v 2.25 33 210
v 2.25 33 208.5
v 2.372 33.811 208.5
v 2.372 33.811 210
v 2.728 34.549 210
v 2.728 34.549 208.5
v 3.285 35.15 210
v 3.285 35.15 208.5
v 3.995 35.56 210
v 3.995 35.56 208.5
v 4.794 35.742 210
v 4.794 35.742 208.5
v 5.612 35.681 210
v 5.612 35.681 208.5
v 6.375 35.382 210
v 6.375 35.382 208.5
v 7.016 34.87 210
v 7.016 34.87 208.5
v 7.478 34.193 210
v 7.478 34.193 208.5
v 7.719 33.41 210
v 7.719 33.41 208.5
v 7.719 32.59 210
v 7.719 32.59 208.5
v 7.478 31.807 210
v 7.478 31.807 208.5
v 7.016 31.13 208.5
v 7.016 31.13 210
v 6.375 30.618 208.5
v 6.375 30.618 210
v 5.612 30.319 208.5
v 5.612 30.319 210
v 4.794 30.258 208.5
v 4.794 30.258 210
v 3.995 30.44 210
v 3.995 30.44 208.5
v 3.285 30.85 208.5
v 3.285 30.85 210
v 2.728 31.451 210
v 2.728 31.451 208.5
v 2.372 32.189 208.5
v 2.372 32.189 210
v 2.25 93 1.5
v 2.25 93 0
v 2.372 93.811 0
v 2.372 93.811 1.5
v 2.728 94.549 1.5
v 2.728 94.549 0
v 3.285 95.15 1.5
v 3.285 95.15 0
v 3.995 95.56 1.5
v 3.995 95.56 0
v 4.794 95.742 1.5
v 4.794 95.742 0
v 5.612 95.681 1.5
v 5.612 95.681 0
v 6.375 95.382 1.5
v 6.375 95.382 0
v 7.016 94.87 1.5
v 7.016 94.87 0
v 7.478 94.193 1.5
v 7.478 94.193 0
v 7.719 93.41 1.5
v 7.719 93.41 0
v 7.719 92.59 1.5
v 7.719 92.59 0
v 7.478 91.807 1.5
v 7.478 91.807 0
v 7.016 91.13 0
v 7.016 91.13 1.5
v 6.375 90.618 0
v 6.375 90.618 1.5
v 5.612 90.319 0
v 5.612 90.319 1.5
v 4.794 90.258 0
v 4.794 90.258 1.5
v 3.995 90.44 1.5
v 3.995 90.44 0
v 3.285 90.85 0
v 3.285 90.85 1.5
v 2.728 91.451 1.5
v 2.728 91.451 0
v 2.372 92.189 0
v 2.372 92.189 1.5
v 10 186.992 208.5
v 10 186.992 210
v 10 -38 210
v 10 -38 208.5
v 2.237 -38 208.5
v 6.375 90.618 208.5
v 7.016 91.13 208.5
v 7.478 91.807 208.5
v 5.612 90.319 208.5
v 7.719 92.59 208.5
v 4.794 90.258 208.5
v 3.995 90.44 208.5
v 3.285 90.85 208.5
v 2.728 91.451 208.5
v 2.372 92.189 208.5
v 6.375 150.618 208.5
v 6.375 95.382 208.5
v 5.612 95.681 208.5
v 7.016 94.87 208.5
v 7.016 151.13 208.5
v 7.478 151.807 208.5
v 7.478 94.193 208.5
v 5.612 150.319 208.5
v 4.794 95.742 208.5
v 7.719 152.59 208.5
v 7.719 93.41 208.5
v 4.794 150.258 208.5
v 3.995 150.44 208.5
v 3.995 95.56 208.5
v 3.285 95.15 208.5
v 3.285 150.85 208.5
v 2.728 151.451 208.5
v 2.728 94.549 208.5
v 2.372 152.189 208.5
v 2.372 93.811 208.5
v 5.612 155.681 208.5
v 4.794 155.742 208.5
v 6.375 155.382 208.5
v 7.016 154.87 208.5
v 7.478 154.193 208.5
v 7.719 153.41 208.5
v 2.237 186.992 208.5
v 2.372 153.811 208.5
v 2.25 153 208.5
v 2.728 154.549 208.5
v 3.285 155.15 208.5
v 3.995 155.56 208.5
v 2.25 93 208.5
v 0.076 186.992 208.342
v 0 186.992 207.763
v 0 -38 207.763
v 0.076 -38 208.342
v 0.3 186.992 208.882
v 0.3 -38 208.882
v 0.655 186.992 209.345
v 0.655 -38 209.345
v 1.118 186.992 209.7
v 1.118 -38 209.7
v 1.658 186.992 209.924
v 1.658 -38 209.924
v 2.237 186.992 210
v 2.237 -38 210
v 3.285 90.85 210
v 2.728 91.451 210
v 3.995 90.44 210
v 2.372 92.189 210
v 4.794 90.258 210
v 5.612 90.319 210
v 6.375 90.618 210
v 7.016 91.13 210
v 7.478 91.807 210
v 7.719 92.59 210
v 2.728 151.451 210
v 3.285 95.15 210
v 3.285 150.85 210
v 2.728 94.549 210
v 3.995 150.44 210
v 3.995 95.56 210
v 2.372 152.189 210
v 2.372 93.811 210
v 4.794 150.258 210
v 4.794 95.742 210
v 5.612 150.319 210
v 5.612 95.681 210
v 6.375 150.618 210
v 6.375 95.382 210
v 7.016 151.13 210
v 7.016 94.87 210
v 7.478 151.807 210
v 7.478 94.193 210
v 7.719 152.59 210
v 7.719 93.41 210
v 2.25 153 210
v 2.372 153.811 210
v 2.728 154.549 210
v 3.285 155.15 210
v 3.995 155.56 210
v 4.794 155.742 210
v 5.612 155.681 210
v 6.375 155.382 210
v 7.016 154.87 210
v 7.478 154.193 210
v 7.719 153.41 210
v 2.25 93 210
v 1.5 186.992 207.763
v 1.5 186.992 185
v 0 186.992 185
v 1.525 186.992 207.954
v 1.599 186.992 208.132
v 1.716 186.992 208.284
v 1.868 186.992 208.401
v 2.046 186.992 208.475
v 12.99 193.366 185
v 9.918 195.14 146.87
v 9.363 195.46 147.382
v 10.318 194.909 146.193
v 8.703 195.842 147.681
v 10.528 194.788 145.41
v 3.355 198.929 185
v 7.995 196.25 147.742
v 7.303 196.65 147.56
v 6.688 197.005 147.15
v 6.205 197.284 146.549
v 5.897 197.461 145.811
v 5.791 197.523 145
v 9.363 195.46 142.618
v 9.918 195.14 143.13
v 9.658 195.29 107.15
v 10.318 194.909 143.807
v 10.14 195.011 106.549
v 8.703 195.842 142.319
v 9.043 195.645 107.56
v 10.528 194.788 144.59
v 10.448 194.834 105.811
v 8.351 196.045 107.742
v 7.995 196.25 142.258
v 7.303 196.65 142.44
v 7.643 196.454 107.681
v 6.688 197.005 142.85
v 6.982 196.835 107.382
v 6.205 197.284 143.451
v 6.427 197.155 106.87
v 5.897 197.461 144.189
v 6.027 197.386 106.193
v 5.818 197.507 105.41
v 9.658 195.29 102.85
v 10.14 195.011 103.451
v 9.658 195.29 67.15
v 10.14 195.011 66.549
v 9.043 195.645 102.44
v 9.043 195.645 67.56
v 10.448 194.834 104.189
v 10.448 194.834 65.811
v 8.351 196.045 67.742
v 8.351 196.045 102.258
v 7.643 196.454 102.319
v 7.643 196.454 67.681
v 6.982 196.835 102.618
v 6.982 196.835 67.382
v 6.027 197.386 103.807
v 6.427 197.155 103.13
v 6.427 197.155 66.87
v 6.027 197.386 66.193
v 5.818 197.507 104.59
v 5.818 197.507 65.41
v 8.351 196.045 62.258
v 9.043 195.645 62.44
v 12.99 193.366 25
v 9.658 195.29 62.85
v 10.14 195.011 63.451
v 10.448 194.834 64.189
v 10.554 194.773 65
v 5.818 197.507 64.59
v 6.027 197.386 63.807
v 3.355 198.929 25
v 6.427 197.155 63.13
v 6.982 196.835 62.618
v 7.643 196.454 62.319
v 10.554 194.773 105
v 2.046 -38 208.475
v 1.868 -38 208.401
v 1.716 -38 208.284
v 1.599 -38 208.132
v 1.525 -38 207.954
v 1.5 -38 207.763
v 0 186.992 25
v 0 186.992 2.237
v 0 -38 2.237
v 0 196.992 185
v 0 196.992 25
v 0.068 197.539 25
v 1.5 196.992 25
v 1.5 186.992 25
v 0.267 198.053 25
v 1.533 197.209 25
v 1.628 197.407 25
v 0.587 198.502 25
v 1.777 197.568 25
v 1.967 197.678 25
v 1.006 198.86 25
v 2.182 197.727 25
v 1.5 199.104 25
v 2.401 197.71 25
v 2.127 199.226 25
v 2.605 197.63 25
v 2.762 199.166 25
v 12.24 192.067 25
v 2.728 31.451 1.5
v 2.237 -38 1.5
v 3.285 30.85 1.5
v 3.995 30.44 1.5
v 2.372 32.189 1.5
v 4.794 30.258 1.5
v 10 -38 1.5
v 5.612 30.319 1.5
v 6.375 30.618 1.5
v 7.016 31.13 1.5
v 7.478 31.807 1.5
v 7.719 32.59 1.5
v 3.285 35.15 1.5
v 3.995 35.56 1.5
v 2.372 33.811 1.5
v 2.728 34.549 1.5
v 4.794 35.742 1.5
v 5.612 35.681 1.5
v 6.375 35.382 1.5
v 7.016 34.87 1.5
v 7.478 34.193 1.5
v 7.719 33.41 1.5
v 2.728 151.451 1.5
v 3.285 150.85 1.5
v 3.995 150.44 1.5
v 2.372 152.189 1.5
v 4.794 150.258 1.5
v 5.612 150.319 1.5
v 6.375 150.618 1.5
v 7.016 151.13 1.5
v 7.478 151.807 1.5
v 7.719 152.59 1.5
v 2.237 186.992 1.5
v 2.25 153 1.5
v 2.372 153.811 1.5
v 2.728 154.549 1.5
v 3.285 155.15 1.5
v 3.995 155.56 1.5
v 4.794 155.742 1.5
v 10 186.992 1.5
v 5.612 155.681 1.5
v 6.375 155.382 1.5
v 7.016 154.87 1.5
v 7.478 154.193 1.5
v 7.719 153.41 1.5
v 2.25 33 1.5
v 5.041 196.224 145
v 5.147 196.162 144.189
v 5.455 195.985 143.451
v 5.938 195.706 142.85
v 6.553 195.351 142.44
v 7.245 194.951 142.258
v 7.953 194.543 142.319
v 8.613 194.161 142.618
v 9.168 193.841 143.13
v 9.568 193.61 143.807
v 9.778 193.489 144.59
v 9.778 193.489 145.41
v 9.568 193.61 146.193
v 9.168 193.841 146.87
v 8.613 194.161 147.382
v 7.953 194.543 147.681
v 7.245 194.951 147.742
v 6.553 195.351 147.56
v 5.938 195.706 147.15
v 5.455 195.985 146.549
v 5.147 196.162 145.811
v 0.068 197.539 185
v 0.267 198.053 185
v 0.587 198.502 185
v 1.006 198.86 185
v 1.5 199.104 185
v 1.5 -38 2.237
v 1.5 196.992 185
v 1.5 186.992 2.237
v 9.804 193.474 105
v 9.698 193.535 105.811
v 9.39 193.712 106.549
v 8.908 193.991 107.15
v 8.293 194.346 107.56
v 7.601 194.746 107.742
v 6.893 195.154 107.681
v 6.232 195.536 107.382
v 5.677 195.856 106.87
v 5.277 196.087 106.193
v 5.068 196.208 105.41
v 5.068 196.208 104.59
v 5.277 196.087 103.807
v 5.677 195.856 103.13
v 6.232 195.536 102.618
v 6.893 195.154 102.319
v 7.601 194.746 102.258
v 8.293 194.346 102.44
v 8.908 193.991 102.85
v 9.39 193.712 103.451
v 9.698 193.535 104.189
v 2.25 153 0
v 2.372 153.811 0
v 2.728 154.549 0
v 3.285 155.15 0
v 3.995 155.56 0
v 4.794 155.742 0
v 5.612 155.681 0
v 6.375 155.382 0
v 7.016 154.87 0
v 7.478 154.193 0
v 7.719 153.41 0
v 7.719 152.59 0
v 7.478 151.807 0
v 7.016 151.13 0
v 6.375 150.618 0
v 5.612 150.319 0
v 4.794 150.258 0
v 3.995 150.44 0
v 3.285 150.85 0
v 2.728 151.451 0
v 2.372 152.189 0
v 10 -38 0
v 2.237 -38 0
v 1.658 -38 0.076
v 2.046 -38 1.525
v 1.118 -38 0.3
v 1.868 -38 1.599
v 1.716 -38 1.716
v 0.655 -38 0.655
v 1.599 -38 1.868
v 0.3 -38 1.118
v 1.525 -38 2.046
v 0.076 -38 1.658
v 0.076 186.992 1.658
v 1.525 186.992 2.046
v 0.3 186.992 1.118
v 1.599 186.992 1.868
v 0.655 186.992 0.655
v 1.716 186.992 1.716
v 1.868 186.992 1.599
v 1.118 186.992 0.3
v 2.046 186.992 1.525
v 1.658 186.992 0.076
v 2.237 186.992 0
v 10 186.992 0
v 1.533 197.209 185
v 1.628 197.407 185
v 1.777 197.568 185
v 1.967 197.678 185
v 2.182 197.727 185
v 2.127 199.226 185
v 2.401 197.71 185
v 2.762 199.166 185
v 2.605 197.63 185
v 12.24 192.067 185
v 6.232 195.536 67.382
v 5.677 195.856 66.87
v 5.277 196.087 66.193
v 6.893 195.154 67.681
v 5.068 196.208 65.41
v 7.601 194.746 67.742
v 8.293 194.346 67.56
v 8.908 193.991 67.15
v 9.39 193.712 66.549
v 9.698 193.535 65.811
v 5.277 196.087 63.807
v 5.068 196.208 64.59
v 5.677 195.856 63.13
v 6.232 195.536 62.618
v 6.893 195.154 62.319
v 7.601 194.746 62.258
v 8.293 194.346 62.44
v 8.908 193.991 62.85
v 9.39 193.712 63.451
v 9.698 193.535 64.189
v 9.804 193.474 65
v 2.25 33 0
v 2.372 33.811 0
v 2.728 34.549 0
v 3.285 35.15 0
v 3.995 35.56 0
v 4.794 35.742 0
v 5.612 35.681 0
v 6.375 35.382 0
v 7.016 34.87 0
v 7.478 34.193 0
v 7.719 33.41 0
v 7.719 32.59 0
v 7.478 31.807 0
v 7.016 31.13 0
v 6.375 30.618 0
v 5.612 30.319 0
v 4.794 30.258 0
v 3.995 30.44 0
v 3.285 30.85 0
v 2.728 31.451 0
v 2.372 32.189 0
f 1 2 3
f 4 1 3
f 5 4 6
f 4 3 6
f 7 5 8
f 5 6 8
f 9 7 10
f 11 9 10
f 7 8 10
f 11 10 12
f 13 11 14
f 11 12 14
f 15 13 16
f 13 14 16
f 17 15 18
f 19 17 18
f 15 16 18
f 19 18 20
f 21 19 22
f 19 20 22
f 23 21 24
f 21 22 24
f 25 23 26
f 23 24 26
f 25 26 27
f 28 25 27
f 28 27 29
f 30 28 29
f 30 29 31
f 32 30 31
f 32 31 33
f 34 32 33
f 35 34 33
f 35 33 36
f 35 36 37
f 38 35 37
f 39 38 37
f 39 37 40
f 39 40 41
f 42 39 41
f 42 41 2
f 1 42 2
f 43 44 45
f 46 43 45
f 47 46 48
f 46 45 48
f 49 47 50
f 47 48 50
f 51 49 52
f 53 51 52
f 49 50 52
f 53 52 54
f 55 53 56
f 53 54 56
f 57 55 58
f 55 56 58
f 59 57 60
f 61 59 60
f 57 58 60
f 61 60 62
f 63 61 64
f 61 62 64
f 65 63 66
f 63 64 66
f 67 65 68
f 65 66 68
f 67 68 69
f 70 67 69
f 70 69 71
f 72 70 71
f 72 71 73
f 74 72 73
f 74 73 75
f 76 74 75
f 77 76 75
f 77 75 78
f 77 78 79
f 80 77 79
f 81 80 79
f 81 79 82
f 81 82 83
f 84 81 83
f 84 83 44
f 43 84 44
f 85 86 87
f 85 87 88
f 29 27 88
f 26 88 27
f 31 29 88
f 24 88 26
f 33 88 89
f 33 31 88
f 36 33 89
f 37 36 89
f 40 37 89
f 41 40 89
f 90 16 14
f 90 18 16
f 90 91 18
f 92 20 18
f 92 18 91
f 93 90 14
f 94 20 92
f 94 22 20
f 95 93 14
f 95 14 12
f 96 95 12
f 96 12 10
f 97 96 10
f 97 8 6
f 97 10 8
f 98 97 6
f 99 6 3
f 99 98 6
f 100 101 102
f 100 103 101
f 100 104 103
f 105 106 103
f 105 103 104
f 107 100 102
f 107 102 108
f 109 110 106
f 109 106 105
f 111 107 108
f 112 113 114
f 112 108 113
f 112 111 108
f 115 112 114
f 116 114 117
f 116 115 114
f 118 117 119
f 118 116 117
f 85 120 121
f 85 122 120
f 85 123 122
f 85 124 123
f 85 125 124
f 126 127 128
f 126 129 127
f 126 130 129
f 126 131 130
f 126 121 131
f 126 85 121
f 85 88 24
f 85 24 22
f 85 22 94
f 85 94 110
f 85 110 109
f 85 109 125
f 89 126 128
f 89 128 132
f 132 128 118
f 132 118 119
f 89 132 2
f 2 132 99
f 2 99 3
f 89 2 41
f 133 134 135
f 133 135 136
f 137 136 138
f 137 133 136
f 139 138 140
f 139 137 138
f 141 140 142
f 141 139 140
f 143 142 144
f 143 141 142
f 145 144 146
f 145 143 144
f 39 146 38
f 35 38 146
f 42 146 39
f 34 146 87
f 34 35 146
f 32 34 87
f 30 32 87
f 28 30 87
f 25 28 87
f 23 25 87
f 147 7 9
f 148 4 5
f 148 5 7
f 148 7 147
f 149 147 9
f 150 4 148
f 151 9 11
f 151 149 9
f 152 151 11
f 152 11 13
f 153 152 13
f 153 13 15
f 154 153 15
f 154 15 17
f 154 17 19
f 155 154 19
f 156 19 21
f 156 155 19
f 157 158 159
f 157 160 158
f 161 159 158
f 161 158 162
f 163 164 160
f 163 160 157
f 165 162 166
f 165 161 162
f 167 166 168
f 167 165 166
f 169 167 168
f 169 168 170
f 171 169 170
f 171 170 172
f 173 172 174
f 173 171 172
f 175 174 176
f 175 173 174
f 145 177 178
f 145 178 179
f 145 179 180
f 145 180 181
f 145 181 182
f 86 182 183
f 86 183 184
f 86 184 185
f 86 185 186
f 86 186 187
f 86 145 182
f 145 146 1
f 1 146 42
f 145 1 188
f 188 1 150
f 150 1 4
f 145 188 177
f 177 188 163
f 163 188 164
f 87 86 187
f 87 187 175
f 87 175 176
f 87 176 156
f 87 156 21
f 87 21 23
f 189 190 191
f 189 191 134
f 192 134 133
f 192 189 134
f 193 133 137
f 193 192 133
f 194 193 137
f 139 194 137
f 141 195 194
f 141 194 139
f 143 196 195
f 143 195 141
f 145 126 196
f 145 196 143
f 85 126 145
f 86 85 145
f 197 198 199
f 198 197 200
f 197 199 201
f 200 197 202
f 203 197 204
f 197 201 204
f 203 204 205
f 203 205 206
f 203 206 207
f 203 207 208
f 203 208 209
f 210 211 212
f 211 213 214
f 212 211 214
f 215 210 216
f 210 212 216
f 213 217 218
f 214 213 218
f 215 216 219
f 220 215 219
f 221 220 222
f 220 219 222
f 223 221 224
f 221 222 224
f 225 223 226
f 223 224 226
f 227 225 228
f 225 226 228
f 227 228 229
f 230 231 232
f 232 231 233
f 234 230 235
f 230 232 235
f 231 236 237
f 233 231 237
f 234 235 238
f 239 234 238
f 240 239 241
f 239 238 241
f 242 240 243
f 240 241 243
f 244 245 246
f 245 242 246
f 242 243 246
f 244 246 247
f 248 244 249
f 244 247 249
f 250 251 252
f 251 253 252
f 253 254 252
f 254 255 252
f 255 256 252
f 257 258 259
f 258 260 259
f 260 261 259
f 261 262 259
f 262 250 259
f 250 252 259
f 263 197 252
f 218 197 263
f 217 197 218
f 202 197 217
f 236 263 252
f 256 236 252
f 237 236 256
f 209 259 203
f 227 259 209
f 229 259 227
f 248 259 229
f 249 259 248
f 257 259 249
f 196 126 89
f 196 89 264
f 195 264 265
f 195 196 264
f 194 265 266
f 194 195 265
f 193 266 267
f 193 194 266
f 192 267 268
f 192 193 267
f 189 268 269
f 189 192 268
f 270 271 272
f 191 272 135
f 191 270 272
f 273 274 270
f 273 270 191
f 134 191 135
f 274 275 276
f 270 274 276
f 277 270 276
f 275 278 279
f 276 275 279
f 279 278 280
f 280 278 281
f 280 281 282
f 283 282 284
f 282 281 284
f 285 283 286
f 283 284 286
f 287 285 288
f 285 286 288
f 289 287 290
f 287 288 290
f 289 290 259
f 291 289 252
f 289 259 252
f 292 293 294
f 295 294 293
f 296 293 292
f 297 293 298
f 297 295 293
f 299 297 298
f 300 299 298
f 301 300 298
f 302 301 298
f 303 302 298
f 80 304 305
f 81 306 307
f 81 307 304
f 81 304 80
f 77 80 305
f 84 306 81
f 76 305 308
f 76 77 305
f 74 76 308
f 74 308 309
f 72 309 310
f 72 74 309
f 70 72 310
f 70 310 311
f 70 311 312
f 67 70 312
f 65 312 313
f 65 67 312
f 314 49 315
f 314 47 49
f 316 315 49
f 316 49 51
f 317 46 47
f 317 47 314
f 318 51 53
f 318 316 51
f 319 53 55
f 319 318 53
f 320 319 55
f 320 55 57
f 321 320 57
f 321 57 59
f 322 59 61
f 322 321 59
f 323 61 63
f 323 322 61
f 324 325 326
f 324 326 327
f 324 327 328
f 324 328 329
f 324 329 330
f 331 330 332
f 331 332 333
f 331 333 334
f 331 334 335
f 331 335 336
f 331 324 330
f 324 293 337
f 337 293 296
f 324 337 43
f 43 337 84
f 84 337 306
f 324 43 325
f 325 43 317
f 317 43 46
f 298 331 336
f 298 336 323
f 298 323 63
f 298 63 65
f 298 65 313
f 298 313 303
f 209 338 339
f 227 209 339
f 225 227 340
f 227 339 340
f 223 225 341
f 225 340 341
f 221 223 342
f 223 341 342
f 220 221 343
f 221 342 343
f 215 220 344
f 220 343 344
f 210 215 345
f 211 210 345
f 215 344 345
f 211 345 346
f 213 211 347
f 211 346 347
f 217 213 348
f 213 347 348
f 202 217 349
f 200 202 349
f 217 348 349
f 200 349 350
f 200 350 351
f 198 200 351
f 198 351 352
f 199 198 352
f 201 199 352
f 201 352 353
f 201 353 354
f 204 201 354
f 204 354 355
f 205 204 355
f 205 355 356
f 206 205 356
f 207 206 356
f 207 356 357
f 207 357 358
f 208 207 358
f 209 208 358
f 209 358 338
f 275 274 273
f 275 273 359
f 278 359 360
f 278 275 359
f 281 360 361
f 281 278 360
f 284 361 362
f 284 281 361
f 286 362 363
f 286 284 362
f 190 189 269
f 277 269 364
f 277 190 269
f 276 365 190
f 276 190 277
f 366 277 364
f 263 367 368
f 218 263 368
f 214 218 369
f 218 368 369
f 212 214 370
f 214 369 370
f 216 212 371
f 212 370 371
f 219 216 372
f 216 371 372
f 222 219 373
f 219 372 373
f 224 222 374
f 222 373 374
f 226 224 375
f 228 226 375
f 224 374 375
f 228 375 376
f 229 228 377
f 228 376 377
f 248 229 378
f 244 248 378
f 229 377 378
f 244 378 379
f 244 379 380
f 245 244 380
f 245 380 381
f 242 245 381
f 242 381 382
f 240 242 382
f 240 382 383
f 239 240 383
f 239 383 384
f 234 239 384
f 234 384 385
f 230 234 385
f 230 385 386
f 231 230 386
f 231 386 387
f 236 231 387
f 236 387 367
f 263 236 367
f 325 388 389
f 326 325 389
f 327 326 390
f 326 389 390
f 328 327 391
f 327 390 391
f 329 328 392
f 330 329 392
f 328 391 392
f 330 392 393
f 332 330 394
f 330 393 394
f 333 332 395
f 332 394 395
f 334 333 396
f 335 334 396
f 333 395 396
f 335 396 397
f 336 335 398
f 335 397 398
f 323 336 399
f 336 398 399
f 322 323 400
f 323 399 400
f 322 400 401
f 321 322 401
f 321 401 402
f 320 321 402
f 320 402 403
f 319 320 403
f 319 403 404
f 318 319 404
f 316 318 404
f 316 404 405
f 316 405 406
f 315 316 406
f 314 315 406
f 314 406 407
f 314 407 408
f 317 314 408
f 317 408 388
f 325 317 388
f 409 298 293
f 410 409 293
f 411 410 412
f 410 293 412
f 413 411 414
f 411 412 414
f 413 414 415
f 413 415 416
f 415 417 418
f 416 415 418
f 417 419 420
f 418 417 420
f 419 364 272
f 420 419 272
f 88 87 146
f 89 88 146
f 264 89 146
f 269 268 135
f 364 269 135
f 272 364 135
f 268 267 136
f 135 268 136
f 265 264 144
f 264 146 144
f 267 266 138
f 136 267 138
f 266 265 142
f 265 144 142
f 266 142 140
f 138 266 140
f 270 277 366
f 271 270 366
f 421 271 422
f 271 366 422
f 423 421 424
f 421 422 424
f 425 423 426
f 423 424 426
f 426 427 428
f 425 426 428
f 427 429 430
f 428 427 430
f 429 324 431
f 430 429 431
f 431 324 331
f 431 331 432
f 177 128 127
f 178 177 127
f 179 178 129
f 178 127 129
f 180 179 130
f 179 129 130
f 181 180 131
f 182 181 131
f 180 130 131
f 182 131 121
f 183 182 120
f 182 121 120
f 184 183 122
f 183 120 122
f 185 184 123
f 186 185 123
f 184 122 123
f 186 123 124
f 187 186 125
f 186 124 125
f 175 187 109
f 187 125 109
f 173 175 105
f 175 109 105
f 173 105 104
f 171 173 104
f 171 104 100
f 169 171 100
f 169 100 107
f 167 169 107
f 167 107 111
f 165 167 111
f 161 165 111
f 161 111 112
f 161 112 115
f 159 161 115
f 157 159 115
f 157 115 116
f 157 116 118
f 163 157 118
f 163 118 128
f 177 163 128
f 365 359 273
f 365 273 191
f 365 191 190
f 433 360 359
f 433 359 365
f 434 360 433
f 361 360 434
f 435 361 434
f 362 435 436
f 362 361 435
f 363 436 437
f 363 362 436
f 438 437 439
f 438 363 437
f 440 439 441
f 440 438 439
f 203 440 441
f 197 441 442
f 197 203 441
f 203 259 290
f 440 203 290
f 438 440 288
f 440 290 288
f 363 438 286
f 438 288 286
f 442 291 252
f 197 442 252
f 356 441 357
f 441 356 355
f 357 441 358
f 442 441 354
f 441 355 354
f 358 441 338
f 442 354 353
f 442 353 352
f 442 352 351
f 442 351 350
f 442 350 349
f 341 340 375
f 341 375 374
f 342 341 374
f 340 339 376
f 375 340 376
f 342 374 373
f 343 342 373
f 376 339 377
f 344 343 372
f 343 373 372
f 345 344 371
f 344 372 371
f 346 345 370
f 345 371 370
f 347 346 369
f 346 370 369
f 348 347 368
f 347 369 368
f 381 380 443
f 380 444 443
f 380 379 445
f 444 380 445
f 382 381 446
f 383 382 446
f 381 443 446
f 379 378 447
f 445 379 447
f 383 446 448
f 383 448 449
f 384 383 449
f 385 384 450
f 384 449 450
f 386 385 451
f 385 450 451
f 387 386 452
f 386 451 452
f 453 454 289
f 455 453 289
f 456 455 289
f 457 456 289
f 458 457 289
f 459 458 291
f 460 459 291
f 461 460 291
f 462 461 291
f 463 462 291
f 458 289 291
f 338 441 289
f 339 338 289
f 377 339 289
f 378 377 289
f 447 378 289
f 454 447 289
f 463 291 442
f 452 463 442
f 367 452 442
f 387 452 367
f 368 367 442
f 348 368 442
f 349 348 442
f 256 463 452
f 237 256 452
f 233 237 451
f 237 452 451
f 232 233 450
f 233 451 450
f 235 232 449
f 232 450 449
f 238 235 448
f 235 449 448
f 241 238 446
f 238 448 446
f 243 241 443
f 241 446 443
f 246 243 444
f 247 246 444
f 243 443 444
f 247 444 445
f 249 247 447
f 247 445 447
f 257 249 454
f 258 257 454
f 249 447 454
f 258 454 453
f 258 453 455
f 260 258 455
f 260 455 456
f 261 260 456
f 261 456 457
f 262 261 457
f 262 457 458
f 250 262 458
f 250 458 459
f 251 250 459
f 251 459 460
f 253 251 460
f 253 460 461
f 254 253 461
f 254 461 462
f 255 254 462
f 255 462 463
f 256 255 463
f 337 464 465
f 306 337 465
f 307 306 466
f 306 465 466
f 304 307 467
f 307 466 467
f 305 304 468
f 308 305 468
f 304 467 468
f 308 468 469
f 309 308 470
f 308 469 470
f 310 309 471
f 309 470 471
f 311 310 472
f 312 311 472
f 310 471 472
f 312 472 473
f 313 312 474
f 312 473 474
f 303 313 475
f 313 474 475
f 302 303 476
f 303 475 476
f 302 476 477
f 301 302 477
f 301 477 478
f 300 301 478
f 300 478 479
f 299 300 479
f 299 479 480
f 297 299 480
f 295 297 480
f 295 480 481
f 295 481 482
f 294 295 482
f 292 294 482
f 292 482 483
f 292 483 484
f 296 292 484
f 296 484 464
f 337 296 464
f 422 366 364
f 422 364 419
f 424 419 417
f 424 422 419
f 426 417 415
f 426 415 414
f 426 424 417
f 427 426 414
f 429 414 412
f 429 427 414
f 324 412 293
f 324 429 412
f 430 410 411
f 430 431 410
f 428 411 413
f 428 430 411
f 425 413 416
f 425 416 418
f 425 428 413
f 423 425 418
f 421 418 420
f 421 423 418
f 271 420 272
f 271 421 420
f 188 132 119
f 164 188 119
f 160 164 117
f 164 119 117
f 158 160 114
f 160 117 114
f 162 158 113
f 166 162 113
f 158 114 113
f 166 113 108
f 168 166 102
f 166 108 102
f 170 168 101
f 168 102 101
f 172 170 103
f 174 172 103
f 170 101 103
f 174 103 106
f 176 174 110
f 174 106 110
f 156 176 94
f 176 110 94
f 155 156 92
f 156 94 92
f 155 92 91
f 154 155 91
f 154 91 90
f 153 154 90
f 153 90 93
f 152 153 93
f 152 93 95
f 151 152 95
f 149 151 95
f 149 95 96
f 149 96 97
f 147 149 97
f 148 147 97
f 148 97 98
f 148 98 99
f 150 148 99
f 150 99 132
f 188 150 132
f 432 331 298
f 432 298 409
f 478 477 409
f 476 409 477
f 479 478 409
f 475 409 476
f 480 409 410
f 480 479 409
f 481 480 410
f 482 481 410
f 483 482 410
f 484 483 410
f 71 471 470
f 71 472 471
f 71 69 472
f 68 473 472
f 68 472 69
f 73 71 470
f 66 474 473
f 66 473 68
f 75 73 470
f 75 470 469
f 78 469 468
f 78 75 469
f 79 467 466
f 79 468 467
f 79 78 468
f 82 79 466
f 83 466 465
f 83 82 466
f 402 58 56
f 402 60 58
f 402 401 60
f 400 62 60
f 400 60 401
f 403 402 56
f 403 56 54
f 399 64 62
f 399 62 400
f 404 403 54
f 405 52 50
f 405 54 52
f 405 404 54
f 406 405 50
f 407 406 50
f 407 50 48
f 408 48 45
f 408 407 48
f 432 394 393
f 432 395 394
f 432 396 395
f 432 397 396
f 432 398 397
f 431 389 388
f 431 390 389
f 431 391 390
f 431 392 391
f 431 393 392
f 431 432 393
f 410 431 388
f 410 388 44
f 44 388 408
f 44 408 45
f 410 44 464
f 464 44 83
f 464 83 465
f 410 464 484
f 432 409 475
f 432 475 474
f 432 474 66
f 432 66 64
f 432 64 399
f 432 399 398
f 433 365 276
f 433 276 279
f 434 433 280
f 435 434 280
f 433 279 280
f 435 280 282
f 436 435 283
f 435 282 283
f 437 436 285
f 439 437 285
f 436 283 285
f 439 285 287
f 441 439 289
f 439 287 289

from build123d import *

# Parameters (mm, degrees)
SKETCH_1_W                       = 1.5
SKETCH_1_H                       = 200
SM_BASE_FLANGE_1_DEPTH           = 210
SM_EDGE_FLANGE_2_DEPTH           = 210
SM_EDGE_FLANGE_2_2_DEPTH         = 210
CUT_EXTRUDE_1_DEPTH              = 25
SKETCH_13_W                      = 1.5
SKETCH_13_H                      = 25
CUT_EXTRUDE_2_DEPTH              = 10
SKETCH_14_R                      = 2.75
CUT_EXTRUDE_3_DEPTH              = 10
SM_EDGE_FLANGE_5_STRIP_W         = 7.4732
SM_EDGE_FLANGE_5_STRIP_H         = 1.5
SM_EDGE_FLANGE_5_STRIP_CUT_DEPTH = 186.992120568
SM_EDGE_FLANGE_5_DEPTH           = 186.992120568
SM_EDGE_FLANGE_6_STRIP_W         = 7.4732
SM_EDGE_FLANGE_6_STRIP_H         = 1.5
SM_EDGE_FLANGE_6_STRIP_CUT_DEPTH = 186.992120568
SM_EDGE_FLANGE_6_DEPTH           = 186.992120568
SKETCH_27_R                      = 2.75
CUT_EXTRUDE_4_DEPTH              = 290.759957722
EXTRUDE_1_DEPTH                  = 38


# Read off the part's stored shape, not the designer's step: 边线-法兰2
# Sheet-metal steps are written as plain solids
with BuildPart() as part:
    # Sketch 1 → 基体-法兰1 (new body)
    with BuildSketch(Plane.XY):
        with Locations((0.75, 100)):
            Rectangle(SKETCH_1_W, SKETCH_1_H)
    extrude(amount=SM_BASE_FLANGE_1_DEPTH)

    # 边线-法兰2 outline → 边线-法兰2 (cut)
    with BuildSketch(Plane.XY):
        with BuildLine():
            ThreePointArc((0, 196.992120568), (0.413161062, 198.28728465), (1.5, 199.103944424))
            Line((1.5, 199.103944424), (1.5, 200))
            Line((1.5, 200), (0, 200))
            Line((0, 200), (0, 196.992120568))
        make_face()
    extrude(amount=SM_EDGE_FLANGE_2_DEPTH, mode=Mode.SUBTRACT)

    # Sm Edge Flange 2 2 outline → Sm Edge Flange 2 2 (add)
    with BuildSketch(Plane.XY):
        with BuildLine():
            Line((12.990381057, 193.366025404), (3.3549, 198.929072986))
            ThreePointArc((3.3549, 198.929072986), (2.446525528, 199.218847051), (1.5, 199.103944424))
            Line((1.5, 199.103944424), (1.5, 196.992120568))
            ThreePointArc((1.5, 196.992120568), (1.8683, 197.63003488), (2.6049, 197.63003488))
            Line((2.6049, 197.63003488), (12.240381057, 192.066987298))
            Line((12.240381057, 192.066987298), (12.990381057, 193.366025404))
        make_face()
    extrude(amount=SM_EDGE_FLANGE_2_2_DEPTH)

    # 草图12 → 切除-拉伸1 (cut)
    with BuildSketch(Plane(origin=(0, 0, 0), x_dir=(-1, 0, 0), z_dir=(0, 0, -1))):
        Polygon((0, 196.992120568), (-3.169381215, 196.992120568), (-3.169381215, 190.456162681), (-17.36722667, 190.456162681), (-17.36722667, 200.115352772), (-3.169381215, 200.115352772), (0, 200.115352772), align=None)
    cut_extrude_1 = extrude(amount=-CUT_EXTRUDE_1_DEPTH, mode=Mode.SUBTRACT)

    # 草图13 → 切除-拉伸2 (cut)
    with BuildSketch(Plane(origin=(0, 196.992120568, 0), x_dir=(1, 0, 0), z_dir=(0, 1, 0))):
        with Locations((0.75, -12.5)):
            Rectangle(SKETCH_13_W, SKETCH_13_H)
    cut_extrude_2 = extrude(amount=-CUT_EXTRUDE_2_DEPTH, mode=Mode.SUBTRACT)

    # 镜向1: 切除-拉伸1, 切除-拉伸2 across plane
    add(cut_extrude_1.mirror(Plane(origin=(0, 0, 105), x_dir=(1, 0, 0), z_dir=(0, 0, -1))), mode=Mode.SUBTRACT)
    add(cut_extrude_2.mirror(Plane(origin=(0, 0, 105), x_dir=(1, 0, 0), z_dir=(0, 0, -1))), mode=Mode.SUBTRACT)

    # 草图14 → 切除-拉伸3 (cut)
    with BuildSketch(Plane(origin=(86.227540378, 149.350480947, 0), x_dir=(0.86602540378444, -0.4999999999999978, 0), z_dir=(-0.4999999999999978, -0.86602540378444, 0))):
        with Locations((-90.996060284, 65)):
            Circle(SKETCH_14_R)
        with Locations((-90.996060284, 105)):
            Circle(SKETCH_14_R)
        with Locations(Location((-90.996060284, 145, 0), (0, 0, 180))):
            Circle(SKETCH_14_R)
    extrude(amount=-CUT_EXTRUDE_3_DEPTH, mode=Mode.SUBTRACT)

    # 边线-法兰5 strip (across the edge) → 边线-法兰5 strip cut (cut)
    with BuildSketch(Plane(origin=(1.5, 0, 0), x_dir=(0, 0, 1), z_dir=(0, 1, 0))):
        with Locations((-1.5, -0.75)):
            Rectangle(SM_EDGE_FLANGE_5_STRIP_W, SM_EDGE_FLANGE_5_STRIP_H)
    extrude(amount=SM_EDGE_FLANGE_5_STRIP_CUT_DEPTH, mode=Mode.SUBTRACT)

    # 边线-法兰5 section (across the edge) → 边线-法兰5 (add)
    with BuildSketch(Plane(origin=(1.5, 0, 0), x_dir=(0, 0, 1), z_dir=(0, 1, 0))):
        with BuildLine():
            Line((0, 0.7366), (0, 8.5))
            Line((0, 8.5), (1.5, 8.5))
            Line((1.5, 8.5), (1.5, 0.7366))
            ThreePointArc((1.5, 0.7366), (1.715745145, 0.215745145), (2.2366, 0))
            Line((2.2366, 0), (2.2366, -1.5))
            ThreePointArc((2.2366, -1.5), (0.655084973, -0.844915027), (0, 0.7366))
        make_face()
    extrude(amount=SM_EDGE_FLANGE_5_DEPTH)

    # 边线-法兰6 strip (across the edge) → 边线-法兰6 strip cut (cut)
    with BuildSketch(Plane(origin=(1.5, 186.992120568, 210), x_dir=(0, 0, -1), z_dir=(0, -1, 0))):
        with Locations((-1.5, -0.75)):
            Rectangle(SM_EDGE_FLANGE_6_STRIP_W, SM_EDGE_FLANGE_6_STRIP_H)
    extrude(amount=SM_EDGE_FLANGE_6_STRIP_CUT_DEPTH, mode=Mode.SUBTRACT)

    # 边线-法兰6 section (across the edge) → 边线-法兰6 (add)
    with BuildSketch(Plane(origin=(1.5, 186.992120568, 210), x_dir=(0, 0, -1), z_dir=(0, -1, 0))):
        with BuildLine():
            Line((0, 0.7366), (0, 8.5))
            Line((0, 8.5), (1.5, 8.5))
            Line((1.5, 8.5), (1.5, 0.7366))
            ThreePointArc((1.5, 0.7366), (1.715745145, 0.215745145), (2.2366, 0))
            Line((2.2366, 0), (2.2366, -1.5))
            ThreePointArc((2.2366, -1.5), (0.655084973, -0.844915027), (0, 0.7366))
        make_face()
    extrude(amount=SM_EDGE_FLANGE_6_DEPTH)

    # 草图27 → 切除-拉伸4 (cut, through all)
    with BuildSketch(Plane(origin=(0, 0, 0), x_dir=(-1, 0, 0), z_dir=(0, 0, -1))):
        with Locations((-5, 153)):
            Circle(SKETCH_27_R)
        with Locations((-5, 93)):
            Circle(SKETCH_27_R)
        with Locations((-5, 33)):
            Circle(SKETCH_27_R)
    extrude(amount=-CUT_EXTRUDE_4_DEPTH, mode=Mode.SUBTRACT)

    # 草图28 → 凸台-拉伸1 (add)
    with BuildSketch(Plane.XZ):
        with BuildLine():
            Line((0, 2.2366), (0, 207.7634))
            ThreePointArc((0, 207.7634), (0.655084973, 209.344915027), (2.2366, 210))
            Line((2.2366, 210), (10, 210))
            Line((10, 210), (10, 208.5))
            Line((10, 208.5), (2.2366, 208.5))
            ThreePointArc((2.2366, 208.5), (1.715745145, 208.284254855), (1.5, 207.7634))
            Line((1.5, 207.7634), (1.5, 2.2366))
            ThreePointArc((1.5, 2.2366), (1.715745145, 1.715745145), (2.2366, 1.5))
            Line((2.2366, 1.5), (10, 1.5))
            Line((10, 1.5), (10, 0))
            Line((10, 0), (2.2366, 0))
            ThreePointArc((2.2366, 0), (0.655084973, 0.655084973), (0, 2.2366))
        make_face()
    extrude(amount=EXTRUDE_1_DEPTH)


solid = part.part
